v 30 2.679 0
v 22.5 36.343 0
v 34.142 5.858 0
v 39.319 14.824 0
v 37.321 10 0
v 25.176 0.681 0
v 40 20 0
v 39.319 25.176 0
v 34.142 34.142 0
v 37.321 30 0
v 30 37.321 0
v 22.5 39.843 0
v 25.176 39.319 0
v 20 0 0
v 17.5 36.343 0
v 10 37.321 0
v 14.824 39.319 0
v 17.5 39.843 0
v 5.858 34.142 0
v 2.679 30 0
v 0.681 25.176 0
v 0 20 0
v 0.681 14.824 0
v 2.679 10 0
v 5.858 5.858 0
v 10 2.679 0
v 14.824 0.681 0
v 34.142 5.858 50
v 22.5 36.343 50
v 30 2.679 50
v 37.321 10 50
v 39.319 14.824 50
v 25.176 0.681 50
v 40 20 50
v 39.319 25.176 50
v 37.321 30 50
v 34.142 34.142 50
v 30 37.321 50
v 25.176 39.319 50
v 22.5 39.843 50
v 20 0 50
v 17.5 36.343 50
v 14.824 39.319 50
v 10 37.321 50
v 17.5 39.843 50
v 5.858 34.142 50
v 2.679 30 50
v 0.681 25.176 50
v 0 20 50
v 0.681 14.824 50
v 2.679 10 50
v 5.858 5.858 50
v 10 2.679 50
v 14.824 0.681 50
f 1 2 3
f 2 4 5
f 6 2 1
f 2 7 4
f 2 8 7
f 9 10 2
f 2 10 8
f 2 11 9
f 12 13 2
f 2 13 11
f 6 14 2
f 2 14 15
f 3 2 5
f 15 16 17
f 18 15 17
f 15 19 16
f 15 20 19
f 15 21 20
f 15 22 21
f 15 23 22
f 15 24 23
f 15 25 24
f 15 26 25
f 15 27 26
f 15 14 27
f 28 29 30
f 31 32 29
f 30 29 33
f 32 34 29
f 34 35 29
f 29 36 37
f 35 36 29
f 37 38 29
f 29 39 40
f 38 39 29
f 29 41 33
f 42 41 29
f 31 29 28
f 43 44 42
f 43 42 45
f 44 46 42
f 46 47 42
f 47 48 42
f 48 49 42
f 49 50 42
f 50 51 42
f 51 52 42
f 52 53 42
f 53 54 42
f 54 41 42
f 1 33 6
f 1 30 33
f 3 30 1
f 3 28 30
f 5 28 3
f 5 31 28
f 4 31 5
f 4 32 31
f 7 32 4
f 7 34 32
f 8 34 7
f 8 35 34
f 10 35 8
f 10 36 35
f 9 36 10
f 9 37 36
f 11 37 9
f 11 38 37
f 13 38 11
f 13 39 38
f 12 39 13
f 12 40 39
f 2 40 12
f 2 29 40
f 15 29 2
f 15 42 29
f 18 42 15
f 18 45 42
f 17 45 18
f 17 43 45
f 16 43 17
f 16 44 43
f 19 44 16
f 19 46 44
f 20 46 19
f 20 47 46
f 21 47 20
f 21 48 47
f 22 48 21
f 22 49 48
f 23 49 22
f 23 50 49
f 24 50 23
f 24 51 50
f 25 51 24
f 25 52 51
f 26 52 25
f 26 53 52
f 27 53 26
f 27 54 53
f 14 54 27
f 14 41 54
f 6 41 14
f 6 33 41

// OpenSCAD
$fn = 32;

// ----------------------------------------------------------------------
// Keyway shaft: d40 shaft, key 5 x 3.5 mm
// ----------------------------------------------------------------------

// --- parameters (mm) ---
shaft_r = 20;             // shaft radius
key_w = 5;                // keyway width
key_d = 3.5;              // keyway depth below the surface line
plate_t = 50;             // shaft length, Z (extrusion height)

shaft_d = 2 * shaft_r;  // shaft diameter
circle_step = 15;  // polygon sampling step, degrees

profile = [[14.824, 39.319], [10, 37.321], [5.858, 34.142], [2.679, 30], [0.681, 25.176], [0, 20], [0.681, 14.824], [2.679, 10], [5.858, 5.858], [10, 2.679], [14.824, 0.681], [20, 0], [25.176, 0.681], [30, 2.679], [34.142, 5.858], [37.321, 10], [39.319, 14.824], [40, 20], [39.319, 25.176], [37.321, 30], [34.142, 34.142], [30, 37.321], [25.176, 39.319], [22.5, 39.843], [22.5, 36.343], [17.5, 36.343], [17.5, 39.843]];  // primary outline, 27 points, counter clockwise

// --- the one profile operation ---
linear_extrude(height = plate_t) polygon(points = profile);
